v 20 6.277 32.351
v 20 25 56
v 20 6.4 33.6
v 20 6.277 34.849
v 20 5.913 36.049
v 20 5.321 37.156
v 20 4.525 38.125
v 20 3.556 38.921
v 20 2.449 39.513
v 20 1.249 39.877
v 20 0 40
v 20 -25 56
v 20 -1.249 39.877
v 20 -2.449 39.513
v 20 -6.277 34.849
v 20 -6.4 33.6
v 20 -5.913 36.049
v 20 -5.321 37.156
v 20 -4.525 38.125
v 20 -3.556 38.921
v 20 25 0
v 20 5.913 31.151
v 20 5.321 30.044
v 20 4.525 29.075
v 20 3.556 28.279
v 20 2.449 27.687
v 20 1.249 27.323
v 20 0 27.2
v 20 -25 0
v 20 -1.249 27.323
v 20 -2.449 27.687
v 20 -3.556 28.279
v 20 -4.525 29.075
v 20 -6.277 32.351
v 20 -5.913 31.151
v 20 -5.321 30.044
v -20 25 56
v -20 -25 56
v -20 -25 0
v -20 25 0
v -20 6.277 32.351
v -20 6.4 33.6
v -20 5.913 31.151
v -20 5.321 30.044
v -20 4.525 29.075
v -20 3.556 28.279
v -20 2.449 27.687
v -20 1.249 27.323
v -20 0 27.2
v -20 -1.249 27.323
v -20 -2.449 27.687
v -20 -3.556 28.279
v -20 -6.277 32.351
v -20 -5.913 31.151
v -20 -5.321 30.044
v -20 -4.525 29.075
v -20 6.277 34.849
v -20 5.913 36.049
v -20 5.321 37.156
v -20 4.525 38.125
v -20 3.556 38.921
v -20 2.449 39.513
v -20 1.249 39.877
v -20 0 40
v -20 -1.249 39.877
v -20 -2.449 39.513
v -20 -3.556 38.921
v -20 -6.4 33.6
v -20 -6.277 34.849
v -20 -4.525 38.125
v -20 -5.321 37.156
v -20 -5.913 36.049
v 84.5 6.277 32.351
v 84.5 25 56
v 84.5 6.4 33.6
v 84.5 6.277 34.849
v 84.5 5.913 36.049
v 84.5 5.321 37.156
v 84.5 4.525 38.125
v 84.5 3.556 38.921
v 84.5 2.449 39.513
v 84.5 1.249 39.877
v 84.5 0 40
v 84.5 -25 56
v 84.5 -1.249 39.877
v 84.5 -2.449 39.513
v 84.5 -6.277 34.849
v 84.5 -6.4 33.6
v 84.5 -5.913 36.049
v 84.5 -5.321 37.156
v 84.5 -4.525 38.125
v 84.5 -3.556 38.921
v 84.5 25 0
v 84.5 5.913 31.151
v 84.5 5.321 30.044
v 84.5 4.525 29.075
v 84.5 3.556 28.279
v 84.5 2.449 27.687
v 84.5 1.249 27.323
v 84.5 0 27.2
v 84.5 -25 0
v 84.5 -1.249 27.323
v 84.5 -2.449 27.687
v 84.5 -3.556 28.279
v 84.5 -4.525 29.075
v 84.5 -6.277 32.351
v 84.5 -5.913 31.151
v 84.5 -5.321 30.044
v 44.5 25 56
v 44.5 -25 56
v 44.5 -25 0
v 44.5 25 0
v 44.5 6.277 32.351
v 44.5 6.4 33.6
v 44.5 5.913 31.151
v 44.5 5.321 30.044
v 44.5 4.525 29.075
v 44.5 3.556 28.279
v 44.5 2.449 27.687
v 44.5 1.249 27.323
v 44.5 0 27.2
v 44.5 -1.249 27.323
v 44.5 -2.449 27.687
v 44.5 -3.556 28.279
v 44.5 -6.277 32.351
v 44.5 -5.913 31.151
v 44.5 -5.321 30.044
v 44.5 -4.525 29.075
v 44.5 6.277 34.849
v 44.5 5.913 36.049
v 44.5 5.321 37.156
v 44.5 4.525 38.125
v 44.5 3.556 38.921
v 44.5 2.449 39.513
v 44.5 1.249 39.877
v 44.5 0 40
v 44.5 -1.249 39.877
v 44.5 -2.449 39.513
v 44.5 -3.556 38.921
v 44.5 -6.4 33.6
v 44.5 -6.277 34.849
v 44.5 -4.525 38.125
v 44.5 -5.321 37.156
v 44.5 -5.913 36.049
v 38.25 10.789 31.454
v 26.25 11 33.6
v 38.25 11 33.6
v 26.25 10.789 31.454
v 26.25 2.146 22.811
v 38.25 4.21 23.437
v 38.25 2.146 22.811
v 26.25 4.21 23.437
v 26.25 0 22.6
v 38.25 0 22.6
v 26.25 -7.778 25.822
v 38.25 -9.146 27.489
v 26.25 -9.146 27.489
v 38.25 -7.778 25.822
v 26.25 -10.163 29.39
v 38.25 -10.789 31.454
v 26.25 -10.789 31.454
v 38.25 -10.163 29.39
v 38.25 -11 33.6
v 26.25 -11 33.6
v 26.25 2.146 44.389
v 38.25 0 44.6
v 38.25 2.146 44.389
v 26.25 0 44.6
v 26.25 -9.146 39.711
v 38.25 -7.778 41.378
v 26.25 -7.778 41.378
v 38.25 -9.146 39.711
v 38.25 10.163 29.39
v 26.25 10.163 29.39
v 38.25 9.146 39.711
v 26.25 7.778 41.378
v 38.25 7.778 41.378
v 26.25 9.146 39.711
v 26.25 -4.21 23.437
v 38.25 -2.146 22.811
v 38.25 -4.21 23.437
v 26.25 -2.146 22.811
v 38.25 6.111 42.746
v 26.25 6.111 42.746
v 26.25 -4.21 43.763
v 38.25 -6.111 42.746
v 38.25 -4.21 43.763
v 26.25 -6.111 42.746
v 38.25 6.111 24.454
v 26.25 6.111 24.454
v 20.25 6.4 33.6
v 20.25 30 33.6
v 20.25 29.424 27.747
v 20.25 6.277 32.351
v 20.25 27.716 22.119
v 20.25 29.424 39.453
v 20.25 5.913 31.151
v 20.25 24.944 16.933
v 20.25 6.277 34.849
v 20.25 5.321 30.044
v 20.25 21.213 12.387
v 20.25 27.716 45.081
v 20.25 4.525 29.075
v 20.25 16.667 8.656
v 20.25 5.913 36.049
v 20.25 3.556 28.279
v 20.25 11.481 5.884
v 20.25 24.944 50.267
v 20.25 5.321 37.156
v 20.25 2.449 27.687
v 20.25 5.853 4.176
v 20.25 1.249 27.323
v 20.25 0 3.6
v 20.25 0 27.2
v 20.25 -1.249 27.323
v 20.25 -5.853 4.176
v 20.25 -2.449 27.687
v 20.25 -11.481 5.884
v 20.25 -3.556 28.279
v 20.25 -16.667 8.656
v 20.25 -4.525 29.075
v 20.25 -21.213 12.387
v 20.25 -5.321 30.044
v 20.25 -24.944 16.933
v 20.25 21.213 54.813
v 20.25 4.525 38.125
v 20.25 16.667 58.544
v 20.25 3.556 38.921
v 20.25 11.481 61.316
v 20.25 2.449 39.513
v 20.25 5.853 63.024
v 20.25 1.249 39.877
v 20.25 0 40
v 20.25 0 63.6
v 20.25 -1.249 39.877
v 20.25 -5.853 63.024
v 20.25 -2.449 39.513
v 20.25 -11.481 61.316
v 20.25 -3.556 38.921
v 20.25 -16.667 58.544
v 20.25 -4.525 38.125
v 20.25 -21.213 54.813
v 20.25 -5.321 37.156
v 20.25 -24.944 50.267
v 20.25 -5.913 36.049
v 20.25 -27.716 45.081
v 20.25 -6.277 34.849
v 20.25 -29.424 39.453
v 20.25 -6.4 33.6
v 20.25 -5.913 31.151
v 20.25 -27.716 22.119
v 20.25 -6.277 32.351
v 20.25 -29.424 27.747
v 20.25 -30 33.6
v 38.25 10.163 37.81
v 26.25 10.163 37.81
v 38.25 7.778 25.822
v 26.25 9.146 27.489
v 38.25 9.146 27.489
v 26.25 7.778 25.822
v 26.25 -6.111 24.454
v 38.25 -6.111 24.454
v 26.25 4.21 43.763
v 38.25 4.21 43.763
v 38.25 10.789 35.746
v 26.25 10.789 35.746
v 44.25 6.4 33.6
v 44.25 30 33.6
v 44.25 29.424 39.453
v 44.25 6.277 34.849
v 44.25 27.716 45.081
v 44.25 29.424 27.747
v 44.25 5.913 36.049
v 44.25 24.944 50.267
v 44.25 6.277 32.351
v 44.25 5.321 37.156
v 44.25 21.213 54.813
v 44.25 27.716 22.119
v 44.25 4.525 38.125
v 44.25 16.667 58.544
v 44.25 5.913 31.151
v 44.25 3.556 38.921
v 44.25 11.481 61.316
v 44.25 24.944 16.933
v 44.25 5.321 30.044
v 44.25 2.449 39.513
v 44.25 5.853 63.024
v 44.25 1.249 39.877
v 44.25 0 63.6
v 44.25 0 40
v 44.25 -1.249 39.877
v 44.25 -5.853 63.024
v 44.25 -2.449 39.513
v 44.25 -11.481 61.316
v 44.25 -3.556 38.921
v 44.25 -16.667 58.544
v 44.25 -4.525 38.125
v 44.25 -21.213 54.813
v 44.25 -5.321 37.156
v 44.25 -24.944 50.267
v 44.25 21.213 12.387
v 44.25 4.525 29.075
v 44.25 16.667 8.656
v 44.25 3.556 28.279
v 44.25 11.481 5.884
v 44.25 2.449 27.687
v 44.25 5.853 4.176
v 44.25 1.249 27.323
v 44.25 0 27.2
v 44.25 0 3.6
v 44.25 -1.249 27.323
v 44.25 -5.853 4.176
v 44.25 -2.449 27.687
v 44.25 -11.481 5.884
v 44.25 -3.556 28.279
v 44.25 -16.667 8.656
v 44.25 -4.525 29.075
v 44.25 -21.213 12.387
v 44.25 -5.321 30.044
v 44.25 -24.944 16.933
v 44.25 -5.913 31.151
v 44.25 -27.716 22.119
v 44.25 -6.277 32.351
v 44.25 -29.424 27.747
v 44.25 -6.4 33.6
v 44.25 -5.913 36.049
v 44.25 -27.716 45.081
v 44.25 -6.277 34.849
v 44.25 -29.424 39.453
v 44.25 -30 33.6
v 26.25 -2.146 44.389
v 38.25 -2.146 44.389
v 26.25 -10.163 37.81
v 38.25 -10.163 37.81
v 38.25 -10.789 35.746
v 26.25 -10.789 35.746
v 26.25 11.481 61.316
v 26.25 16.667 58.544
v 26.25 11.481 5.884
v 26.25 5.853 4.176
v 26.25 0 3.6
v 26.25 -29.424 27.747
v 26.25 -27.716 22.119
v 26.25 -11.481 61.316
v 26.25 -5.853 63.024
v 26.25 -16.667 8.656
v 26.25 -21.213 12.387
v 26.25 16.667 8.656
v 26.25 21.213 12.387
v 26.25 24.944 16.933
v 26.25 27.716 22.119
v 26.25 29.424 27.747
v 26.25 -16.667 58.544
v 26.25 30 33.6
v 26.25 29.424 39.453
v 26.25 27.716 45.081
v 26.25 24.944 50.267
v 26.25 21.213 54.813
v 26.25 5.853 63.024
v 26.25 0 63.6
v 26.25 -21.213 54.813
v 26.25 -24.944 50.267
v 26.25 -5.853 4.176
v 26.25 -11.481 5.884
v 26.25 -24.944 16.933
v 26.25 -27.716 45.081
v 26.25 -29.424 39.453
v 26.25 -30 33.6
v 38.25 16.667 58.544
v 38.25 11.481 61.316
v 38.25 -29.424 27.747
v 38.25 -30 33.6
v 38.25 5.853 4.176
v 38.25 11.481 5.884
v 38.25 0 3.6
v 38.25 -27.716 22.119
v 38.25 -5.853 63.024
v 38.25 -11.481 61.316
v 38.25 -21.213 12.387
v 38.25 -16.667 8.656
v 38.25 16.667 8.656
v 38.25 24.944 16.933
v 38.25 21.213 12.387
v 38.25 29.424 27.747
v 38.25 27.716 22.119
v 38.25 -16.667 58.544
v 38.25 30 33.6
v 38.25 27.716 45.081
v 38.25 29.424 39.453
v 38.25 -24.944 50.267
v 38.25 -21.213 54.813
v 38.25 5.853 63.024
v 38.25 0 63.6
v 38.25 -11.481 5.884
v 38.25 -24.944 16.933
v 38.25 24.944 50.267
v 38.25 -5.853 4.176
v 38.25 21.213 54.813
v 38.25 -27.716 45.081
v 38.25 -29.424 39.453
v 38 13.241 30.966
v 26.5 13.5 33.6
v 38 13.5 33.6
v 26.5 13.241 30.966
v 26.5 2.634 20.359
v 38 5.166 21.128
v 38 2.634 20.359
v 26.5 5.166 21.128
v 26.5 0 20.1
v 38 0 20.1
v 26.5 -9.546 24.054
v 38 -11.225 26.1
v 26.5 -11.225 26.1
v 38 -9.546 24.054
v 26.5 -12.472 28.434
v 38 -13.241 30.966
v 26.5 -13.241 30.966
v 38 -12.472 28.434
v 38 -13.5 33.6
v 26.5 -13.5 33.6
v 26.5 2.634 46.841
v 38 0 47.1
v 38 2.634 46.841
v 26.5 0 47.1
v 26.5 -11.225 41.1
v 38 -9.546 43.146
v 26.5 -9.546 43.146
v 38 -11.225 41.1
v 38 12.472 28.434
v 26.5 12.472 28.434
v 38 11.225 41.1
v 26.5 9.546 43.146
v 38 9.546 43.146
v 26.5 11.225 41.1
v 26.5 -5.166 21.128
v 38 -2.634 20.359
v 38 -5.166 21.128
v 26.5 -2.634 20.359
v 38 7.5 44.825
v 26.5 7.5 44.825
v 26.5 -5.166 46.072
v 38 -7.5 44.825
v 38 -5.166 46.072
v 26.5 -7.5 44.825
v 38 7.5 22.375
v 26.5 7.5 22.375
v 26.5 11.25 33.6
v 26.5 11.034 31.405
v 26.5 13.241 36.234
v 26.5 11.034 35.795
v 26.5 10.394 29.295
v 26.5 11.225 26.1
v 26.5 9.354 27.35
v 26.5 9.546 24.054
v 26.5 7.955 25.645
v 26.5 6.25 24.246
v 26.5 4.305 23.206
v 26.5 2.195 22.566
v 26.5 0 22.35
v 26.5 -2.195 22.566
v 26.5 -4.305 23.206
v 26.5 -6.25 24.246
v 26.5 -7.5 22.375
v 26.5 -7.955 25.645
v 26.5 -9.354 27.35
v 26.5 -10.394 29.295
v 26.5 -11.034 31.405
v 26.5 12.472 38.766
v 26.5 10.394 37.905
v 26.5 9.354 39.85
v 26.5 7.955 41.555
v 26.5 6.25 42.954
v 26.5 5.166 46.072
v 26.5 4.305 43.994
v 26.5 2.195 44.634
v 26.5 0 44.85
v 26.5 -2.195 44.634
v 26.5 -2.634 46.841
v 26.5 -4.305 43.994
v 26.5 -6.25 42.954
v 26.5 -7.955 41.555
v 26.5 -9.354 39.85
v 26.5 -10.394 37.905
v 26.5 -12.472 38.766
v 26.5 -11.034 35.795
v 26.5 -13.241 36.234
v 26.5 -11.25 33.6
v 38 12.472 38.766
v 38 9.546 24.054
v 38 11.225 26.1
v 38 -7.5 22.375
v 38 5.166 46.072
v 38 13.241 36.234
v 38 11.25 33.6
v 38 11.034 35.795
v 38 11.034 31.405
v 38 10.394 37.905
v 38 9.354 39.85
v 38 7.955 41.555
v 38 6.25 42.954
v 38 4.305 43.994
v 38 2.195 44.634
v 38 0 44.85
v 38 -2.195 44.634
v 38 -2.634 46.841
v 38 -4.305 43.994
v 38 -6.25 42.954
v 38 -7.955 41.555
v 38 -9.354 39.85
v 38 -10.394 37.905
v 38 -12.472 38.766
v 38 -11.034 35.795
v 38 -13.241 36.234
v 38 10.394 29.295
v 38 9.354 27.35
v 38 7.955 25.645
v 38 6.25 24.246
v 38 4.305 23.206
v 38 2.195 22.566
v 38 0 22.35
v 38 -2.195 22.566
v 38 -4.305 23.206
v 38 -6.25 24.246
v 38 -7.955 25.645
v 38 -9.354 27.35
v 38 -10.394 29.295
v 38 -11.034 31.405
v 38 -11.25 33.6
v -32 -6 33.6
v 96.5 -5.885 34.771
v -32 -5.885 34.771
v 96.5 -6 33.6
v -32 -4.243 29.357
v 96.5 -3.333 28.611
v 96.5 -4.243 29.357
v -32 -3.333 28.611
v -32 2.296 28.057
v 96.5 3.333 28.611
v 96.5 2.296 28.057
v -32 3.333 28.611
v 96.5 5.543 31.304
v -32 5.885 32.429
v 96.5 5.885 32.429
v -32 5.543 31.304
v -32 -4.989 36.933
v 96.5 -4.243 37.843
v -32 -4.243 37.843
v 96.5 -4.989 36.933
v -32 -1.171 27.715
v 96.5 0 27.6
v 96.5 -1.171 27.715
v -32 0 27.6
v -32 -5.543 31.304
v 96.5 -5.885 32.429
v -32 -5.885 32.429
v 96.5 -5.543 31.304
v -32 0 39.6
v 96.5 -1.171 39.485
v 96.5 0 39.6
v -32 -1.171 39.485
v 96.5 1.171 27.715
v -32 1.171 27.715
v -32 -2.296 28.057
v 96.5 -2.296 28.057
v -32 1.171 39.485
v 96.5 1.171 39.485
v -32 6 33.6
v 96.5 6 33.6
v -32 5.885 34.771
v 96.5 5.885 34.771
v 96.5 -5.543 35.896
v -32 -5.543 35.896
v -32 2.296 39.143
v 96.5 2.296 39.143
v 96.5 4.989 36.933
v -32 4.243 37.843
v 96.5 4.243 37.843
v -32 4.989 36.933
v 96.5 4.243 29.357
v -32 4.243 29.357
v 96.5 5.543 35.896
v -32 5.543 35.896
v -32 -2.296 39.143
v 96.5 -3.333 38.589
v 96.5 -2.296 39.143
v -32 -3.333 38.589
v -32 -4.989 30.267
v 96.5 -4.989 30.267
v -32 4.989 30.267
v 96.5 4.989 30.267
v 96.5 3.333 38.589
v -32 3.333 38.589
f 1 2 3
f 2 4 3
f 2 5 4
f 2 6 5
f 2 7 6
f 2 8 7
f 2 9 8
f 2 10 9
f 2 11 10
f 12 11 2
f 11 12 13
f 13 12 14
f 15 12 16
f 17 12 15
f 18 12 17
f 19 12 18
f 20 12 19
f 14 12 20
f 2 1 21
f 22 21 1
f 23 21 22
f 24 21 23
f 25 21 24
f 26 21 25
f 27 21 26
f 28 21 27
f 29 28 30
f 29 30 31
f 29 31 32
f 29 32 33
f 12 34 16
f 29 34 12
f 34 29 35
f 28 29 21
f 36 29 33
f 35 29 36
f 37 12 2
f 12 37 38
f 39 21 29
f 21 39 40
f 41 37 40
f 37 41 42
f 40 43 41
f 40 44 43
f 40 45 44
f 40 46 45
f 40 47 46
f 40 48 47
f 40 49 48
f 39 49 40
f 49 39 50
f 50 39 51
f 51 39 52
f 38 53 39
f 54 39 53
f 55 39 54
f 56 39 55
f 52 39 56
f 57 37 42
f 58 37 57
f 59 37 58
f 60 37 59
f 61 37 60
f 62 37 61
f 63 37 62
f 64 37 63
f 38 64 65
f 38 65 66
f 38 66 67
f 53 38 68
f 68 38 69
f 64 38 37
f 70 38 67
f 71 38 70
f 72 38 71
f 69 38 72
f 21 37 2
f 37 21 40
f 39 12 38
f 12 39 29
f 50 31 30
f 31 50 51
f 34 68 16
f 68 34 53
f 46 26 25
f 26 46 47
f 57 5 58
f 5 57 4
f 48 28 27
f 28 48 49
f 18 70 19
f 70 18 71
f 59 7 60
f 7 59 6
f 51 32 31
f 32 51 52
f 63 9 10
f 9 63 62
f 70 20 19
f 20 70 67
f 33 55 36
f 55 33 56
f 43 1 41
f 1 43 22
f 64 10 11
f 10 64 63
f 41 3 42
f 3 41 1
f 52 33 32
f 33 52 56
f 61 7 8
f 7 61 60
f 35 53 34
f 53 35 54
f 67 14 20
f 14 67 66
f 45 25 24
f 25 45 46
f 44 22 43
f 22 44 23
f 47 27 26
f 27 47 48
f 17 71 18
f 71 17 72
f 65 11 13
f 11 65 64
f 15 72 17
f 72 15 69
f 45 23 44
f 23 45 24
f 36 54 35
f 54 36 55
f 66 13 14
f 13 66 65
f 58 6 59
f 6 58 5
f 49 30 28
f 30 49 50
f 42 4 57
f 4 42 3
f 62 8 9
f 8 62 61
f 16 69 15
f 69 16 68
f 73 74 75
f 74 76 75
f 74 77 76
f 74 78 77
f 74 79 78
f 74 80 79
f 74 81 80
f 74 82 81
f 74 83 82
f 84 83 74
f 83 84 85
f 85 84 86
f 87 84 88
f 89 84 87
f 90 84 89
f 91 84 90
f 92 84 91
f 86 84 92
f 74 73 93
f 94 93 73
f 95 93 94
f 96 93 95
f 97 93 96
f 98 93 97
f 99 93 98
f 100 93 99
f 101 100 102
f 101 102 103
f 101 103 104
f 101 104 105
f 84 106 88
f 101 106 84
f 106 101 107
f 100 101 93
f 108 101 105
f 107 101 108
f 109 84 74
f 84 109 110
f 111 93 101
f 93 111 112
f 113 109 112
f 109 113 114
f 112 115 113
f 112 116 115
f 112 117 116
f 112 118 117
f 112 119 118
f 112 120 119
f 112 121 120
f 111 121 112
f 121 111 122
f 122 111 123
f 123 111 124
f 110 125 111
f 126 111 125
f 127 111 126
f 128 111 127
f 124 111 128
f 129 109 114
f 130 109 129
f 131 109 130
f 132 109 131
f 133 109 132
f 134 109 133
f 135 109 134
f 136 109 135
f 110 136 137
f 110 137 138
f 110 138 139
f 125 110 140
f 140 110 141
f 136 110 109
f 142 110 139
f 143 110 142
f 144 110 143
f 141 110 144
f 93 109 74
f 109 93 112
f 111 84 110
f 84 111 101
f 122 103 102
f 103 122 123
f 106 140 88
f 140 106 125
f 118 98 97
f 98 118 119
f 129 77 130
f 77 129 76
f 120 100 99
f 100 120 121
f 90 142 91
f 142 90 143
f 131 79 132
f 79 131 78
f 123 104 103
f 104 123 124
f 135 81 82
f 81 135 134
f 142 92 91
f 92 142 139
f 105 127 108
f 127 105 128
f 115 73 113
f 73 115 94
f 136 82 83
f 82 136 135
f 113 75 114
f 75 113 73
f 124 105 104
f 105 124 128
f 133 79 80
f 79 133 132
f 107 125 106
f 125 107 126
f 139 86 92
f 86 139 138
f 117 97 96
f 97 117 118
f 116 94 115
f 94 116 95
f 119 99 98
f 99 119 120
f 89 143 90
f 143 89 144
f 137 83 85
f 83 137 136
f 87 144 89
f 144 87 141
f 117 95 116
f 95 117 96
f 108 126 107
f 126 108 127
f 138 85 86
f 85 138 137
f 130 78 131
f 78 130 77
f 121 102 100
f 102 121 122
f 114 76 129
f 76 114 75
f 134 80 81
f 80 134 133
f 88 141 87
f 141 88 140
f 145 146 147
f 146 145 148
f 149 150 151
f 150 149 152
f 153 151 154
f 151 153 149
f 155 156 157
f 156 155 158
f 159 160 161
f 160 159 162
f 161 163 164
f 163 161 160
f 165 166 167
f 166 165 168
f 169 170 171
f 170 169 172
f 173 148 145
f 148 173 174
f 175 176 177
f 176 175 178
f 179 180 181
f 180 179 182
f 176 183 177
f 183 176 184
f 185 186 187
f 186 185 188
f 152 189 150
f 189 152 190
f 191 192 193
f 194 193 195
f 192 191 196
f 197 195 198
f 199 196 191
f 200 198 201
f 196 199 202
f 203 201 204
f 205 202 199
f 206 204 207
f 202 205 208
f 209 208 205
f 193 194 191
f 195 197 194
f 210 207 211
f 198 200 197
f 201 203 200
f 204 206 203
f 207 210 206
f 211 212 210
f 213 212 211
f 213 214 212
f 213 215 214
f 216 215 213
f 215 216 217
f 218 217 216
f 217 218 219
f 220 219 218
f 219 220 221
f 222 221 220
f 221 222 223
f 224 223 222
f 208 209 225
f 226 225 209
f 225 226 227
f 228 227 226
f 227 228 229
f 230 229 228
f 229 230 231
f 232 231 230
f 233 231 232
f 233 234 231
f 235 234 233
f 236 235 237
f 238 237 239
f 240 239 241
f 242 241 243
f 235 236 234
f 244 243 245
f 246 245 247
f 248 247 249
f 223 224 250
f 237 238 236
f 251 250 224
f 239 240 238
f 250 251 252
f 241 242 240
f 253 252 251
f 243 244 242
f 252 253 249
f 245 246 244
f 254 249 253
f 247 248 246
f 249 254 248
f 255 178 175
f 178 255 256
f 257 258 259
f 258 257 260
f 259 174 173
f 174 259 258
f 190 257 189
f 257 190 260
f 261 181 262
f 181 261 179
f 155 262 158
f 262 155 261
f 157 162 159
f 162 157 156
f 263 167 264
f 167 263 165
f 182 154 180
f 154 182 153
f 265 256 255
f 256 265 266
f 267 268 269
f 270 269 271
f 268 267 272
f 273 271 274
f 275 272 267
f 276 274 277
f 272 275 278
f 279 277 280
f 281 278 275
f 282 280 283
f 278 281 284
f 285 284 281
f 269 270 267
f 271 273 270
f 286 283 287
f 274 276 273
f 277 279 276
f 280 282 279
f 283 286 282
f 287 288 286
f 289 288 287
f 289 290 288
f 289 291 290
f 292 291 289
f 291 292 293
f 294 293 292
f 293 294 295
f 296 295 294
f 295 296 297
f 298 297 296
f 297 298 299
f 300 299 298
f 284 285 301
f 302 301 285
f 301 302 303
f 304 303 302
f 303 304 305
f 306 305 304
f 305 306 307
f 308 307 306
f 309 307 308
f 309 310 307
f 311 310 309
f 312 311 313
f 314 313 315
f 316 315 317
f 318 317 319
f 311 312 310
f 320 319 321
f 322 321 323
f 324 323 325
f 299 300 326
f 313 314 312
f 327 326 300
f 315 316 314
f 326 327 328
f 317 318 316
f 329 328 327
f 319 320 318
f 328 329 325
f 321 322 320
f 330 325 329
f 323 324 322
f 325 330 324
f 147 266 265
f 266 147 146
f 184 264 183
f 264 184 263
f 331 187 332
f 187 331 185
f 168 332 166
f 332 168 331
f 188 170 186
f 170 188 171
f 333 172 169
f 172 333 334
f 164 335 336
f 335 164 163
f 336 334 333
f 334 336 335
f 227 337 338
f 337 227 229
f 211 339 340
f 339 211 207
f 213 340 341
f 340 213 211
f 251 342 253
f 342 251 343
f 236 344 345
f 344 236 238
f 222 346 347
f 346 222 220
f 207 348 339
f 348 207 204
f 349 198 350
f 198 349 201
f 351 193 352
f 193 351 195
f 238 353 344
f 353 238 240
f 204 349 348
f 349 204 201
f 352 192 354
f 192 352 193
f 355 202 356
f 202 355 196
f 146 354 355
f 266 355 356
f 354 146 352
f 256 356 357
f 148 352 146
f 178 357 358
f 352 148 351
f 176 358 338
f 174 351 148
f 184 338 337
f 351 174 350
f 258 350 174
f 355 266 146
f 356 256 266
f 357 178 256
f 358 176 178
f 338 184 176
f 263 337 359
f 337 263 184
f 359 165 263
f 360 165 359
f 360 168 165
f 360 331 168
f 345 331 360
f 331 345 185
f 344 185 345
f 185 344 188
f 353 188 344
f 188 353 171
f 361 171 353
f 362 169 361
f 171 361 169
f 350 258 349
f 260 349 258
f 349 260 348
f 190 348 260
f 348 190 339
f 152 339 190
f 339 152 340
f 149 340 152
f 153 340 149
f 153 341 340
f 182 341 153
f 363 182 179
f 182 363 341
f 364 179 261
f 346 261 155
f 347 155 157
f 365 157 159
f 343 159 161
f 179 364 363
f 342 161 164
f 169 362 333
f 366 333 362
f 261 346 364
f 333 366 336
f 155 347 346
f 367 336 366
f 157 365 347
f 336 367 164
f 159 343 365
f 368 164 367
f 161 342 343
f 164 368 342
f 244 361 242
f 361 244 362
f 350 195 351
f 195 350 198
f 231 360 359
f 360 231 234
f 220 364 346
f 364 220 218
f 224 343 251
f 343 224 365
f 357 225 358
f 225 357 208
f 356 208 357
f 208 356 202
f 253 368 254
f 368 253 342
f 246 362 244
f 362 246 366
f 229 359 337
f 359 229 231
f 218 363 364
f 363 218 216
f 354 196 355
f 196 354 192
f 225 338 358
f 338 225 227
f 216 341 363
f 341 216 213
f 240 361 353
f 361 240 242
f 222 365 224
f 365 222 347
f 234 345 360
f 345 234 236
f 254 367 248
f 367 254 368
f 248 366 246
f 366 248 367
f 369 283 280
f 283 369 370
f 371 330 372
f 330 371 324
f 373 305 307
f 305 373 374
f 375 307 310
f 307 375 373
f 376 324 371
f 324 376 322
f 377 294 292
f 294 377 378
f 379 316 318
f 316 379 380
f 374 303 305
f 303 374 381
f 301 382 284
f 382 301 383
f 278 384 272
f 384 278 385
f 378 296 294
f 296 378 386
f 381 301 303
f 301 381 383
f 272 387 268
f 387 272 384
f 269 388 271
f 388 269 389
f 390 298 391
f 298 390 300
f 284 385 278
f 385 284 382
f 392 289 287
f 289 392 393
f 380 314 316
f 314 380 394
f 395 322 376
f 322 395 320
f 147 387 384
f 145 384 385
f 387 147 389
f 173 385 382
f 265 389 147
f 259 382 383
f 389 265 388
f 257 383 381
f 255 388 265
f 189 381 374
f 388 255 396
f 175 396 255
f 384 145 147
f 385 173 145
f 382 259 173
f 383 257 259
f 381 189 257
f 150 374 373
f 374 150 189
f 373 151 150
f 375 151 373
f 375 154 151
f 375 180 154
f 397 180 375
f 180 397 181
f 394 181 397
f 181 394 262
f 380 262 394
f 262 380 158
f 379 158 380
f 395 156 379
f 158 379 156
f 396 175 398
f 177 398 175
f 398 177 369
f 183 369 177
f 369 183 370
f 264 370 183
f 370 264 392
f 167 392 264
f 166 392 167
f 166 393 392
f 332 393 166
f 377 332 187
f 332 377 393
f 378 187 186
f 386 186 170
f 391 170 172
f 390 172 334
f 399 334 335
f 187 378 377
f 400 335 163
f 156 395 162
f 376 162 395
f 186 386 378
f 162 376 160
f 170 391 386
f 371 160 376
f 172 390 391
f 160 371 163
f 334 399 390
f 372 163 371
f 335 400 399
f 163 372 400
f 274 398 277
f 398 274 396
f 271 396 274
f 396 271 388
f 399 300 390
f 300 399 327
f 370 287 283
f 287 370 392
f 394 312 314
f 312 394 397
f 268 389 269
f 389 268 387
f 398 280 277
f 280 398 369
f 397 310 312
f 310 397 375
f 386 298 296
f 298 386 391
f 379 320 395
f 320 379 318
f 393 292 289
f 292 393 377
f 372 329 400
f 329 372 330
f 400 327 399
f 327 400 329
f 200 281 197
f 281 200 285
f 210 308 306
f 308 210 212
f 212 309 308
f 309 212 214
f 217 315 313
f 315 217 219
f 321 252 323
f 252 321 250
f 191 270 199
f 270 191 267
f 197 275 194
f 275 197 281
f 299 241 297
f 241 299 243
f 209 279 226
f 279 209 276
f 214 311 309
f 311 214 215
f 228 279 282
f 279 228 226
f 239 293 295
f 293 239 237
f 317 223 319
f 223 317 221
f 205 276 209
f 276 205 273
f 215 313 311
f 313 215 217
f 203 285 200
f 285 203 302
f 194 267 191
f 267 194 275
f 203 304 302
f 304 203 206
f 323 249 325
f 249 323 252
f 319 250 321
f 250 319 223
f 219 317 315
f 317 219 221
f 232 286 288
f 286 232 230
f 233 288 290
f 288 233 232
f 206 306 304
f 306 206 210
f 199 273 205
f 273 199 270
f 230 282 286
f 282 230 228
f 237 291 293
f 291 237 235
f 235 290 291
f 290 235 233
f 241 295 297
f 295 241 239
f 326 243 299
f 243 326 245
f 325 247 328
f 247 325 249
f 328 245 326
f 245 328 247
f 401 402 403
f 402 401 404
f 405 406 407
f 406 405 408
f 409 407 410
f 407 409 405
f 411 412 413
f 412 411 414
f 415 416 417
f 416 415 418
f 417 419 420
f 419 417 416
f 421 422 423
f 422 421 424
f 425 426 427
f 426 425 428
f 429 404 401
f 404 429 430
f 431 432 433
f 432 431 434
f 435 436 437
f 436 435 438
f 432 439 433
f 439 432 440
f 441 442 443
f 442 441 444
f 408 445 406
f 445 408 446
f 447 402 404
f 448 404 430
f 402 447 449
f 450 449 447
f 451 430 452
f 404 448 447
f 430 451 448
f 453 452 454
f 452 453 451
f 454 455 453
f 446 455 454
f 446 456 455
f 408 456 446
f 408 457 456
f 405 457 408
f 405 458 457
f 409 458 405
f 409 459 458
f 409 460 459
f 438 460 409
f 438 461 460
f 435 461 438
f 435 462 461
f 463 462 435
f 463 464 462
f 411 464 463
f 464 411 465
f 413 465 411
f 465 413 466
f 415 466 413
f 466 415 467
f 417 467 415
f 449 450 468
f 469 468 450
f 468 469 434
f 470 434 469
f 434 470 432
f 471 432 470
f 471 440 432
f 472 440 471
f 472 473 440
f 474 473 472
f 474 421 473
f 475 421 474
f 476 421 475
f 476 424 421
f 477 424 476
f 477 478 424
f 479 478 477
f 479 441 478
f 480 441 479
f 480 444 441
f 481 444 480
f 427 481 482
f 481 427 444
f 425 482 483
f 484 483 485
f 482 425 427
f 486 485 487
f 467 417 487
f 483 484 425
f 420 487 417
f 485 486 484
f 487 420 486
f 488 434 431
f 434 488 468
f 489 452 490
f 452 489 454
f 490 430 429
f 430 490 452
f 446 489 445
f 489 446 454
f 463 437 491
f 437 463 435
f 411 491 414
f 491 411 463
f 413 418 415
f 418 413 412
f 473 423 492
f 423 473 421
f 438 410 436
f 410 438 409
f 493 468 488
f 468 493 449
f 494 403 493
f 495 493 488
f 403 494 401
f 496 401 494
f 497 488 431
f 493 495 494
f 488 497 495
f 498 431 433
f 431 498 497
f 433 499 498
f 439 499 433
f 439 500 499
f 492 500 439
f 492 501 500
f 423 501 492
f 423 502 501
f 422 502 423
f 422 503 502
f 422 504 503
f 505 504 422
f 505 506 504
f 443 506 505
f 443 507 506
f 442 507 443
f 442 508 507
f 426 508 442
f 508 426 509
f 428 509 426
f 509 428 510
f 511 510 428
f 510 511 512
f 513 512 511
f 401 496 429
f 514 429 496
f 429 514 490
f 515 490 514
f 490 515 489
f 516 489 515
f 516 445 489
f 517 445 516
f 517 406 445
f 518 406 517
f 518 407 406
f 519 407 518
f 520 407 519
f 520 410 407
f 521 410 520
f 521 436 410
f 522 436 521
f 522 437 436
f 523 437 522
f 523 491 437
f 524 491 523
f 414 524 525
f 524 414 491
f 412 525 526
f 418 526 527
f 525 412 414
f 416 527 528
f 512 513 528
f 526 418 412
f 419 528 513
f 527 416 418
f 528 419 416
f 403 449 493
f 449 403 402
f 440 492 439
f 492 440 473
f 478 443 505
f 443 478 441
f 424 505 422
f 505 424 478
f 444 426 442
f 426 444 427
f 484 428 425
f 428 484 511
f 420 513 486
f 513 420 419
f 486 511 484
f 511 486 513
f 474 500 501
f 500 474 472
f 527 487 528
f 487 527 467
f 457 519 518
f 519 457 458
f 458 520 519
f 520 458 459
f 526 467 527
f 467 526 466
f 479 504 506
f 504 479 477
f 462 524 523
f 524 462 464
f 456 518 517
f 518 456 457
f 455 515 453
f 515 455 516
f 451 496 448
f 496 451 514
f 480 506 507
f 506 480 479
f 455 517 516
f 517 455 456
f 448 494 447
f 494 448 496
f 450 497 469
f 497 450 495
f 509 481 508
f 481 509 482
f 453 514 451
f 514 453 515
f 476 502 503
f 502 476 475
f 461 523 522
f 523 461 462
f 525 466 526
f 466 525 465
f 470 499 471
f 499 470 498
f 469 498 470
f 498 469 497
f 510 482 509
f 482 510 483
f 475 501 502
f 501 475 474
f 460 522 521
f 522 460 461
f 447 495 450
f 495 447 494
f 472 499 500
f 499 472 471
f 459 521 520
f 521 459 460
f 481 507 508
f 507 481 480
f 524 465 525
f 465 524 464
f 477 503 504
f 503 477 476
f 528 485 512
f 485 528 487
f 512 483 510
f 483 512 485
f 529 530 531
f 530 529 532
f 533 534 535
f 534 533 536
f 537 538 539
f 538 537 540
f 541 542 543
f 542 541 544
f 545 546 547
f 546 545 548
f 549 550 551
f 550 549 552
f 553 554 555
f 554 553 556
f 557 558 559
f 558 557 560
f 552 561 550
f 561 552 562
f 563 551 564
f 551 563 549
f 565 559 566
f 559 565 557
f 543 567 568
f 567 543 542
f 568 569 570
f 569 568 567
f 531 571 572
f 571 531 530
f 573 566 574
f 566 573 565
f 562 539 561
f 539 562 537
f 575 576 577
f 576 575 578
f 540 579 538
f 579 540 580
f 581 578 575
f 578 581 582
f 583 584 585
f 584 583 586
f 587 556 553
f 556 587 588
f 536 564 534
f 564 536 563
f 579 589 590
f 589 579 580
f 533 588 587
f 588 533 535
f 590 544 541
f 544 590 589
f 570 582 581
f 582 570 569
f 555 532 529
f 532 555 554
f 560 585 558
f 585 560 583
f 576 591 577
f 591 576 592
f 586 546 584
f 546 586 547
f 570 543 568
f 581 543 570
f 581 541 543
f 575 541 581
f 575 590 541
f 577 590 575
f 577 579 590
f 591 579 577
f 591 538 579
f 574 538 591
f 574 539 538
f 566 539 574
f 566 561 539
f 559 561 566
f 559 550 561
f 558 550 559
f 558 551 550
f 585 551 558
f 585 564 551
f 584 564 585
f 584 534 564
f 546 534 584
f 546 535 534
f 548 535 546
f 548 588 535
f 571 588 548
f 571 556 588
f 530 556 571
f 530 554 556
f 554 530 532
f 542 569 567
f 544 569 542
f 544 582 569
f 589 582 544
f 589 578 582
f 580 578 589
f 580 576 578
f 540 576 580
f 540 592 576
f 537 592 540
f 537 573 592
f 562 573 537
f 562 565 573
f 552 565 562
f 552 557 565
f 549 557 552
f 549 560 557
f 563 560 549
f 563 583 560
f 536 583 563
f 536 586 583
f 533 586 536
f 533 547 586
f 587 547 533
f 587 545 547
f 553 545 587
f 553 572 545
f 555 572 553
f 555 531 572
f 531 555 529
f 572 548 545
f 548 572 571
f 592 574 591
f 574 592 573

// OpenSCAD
$fn = 32;

// ------------------------------------------------------------------------
// Pulley assembly: d60 pulley with a belt, shaft d12
// Every part is its own module, assembly() places them once.
// ------------------------------------------------------------------------

// --- part 1 ---
module support1() {
  difference() {
    translate([-20, -25, 0]) cube([40, 50, 56]);
    translate([0, 0, 33.6]) rotate([0, 90, 0]) cylinder(h = 42, d = 12.8, center = true);
  }
}

// --- part 2 ---
module support2() {
  difference() {
    translate([-20, -25, 0]) cube([40, 50, 56]);
    translate([0, 0, 33.6]) rotate([0, 90, 0]) cylinder(h = 42, d = 12.8, center = true);
  }
}

// --- part 3 ---
module shaft() {
  translate([0, 0, -64.25]) cylinder(h = 128.5, d = 12);
}

// --- part 4 ---
module pulley() {
  difference() {
    union() {
      cylinder(h = 24, d = 22);
      cylinder(h = 6, d = 60);
      translate([0, 0, 18]) cylinder(h = 6, d = 60);
    }
    translate([0, 0, -1]) cylinder(h = 26, d = 12.8);
  }
}

// --- part 5 ---
module belt() {
  difference() {
      translate([0, 0, 0]) cylinder(h = 11.5, d = 27);
      translate([0, 0, -1]) cylinder(h = 13.5, d = 22.5);
    }
}

// --- assembly ---
module assembly() {
  translate([0, 0, 0]) rotate([0, 0, 0]) support1();
  translate([64.5, 0, 0]) rotate([0, 0, 0]) support2();
  translate([32.25, 0, 33.6]) rotate([0, 90, 0]) shaft();
  translate([20.25, 0, 33.6]) rotate([0, 90, 0]) pulley();
  translate([26.5, 0, 33.6]) rotate([0, 90, 0]) belt();
}

assembly();
